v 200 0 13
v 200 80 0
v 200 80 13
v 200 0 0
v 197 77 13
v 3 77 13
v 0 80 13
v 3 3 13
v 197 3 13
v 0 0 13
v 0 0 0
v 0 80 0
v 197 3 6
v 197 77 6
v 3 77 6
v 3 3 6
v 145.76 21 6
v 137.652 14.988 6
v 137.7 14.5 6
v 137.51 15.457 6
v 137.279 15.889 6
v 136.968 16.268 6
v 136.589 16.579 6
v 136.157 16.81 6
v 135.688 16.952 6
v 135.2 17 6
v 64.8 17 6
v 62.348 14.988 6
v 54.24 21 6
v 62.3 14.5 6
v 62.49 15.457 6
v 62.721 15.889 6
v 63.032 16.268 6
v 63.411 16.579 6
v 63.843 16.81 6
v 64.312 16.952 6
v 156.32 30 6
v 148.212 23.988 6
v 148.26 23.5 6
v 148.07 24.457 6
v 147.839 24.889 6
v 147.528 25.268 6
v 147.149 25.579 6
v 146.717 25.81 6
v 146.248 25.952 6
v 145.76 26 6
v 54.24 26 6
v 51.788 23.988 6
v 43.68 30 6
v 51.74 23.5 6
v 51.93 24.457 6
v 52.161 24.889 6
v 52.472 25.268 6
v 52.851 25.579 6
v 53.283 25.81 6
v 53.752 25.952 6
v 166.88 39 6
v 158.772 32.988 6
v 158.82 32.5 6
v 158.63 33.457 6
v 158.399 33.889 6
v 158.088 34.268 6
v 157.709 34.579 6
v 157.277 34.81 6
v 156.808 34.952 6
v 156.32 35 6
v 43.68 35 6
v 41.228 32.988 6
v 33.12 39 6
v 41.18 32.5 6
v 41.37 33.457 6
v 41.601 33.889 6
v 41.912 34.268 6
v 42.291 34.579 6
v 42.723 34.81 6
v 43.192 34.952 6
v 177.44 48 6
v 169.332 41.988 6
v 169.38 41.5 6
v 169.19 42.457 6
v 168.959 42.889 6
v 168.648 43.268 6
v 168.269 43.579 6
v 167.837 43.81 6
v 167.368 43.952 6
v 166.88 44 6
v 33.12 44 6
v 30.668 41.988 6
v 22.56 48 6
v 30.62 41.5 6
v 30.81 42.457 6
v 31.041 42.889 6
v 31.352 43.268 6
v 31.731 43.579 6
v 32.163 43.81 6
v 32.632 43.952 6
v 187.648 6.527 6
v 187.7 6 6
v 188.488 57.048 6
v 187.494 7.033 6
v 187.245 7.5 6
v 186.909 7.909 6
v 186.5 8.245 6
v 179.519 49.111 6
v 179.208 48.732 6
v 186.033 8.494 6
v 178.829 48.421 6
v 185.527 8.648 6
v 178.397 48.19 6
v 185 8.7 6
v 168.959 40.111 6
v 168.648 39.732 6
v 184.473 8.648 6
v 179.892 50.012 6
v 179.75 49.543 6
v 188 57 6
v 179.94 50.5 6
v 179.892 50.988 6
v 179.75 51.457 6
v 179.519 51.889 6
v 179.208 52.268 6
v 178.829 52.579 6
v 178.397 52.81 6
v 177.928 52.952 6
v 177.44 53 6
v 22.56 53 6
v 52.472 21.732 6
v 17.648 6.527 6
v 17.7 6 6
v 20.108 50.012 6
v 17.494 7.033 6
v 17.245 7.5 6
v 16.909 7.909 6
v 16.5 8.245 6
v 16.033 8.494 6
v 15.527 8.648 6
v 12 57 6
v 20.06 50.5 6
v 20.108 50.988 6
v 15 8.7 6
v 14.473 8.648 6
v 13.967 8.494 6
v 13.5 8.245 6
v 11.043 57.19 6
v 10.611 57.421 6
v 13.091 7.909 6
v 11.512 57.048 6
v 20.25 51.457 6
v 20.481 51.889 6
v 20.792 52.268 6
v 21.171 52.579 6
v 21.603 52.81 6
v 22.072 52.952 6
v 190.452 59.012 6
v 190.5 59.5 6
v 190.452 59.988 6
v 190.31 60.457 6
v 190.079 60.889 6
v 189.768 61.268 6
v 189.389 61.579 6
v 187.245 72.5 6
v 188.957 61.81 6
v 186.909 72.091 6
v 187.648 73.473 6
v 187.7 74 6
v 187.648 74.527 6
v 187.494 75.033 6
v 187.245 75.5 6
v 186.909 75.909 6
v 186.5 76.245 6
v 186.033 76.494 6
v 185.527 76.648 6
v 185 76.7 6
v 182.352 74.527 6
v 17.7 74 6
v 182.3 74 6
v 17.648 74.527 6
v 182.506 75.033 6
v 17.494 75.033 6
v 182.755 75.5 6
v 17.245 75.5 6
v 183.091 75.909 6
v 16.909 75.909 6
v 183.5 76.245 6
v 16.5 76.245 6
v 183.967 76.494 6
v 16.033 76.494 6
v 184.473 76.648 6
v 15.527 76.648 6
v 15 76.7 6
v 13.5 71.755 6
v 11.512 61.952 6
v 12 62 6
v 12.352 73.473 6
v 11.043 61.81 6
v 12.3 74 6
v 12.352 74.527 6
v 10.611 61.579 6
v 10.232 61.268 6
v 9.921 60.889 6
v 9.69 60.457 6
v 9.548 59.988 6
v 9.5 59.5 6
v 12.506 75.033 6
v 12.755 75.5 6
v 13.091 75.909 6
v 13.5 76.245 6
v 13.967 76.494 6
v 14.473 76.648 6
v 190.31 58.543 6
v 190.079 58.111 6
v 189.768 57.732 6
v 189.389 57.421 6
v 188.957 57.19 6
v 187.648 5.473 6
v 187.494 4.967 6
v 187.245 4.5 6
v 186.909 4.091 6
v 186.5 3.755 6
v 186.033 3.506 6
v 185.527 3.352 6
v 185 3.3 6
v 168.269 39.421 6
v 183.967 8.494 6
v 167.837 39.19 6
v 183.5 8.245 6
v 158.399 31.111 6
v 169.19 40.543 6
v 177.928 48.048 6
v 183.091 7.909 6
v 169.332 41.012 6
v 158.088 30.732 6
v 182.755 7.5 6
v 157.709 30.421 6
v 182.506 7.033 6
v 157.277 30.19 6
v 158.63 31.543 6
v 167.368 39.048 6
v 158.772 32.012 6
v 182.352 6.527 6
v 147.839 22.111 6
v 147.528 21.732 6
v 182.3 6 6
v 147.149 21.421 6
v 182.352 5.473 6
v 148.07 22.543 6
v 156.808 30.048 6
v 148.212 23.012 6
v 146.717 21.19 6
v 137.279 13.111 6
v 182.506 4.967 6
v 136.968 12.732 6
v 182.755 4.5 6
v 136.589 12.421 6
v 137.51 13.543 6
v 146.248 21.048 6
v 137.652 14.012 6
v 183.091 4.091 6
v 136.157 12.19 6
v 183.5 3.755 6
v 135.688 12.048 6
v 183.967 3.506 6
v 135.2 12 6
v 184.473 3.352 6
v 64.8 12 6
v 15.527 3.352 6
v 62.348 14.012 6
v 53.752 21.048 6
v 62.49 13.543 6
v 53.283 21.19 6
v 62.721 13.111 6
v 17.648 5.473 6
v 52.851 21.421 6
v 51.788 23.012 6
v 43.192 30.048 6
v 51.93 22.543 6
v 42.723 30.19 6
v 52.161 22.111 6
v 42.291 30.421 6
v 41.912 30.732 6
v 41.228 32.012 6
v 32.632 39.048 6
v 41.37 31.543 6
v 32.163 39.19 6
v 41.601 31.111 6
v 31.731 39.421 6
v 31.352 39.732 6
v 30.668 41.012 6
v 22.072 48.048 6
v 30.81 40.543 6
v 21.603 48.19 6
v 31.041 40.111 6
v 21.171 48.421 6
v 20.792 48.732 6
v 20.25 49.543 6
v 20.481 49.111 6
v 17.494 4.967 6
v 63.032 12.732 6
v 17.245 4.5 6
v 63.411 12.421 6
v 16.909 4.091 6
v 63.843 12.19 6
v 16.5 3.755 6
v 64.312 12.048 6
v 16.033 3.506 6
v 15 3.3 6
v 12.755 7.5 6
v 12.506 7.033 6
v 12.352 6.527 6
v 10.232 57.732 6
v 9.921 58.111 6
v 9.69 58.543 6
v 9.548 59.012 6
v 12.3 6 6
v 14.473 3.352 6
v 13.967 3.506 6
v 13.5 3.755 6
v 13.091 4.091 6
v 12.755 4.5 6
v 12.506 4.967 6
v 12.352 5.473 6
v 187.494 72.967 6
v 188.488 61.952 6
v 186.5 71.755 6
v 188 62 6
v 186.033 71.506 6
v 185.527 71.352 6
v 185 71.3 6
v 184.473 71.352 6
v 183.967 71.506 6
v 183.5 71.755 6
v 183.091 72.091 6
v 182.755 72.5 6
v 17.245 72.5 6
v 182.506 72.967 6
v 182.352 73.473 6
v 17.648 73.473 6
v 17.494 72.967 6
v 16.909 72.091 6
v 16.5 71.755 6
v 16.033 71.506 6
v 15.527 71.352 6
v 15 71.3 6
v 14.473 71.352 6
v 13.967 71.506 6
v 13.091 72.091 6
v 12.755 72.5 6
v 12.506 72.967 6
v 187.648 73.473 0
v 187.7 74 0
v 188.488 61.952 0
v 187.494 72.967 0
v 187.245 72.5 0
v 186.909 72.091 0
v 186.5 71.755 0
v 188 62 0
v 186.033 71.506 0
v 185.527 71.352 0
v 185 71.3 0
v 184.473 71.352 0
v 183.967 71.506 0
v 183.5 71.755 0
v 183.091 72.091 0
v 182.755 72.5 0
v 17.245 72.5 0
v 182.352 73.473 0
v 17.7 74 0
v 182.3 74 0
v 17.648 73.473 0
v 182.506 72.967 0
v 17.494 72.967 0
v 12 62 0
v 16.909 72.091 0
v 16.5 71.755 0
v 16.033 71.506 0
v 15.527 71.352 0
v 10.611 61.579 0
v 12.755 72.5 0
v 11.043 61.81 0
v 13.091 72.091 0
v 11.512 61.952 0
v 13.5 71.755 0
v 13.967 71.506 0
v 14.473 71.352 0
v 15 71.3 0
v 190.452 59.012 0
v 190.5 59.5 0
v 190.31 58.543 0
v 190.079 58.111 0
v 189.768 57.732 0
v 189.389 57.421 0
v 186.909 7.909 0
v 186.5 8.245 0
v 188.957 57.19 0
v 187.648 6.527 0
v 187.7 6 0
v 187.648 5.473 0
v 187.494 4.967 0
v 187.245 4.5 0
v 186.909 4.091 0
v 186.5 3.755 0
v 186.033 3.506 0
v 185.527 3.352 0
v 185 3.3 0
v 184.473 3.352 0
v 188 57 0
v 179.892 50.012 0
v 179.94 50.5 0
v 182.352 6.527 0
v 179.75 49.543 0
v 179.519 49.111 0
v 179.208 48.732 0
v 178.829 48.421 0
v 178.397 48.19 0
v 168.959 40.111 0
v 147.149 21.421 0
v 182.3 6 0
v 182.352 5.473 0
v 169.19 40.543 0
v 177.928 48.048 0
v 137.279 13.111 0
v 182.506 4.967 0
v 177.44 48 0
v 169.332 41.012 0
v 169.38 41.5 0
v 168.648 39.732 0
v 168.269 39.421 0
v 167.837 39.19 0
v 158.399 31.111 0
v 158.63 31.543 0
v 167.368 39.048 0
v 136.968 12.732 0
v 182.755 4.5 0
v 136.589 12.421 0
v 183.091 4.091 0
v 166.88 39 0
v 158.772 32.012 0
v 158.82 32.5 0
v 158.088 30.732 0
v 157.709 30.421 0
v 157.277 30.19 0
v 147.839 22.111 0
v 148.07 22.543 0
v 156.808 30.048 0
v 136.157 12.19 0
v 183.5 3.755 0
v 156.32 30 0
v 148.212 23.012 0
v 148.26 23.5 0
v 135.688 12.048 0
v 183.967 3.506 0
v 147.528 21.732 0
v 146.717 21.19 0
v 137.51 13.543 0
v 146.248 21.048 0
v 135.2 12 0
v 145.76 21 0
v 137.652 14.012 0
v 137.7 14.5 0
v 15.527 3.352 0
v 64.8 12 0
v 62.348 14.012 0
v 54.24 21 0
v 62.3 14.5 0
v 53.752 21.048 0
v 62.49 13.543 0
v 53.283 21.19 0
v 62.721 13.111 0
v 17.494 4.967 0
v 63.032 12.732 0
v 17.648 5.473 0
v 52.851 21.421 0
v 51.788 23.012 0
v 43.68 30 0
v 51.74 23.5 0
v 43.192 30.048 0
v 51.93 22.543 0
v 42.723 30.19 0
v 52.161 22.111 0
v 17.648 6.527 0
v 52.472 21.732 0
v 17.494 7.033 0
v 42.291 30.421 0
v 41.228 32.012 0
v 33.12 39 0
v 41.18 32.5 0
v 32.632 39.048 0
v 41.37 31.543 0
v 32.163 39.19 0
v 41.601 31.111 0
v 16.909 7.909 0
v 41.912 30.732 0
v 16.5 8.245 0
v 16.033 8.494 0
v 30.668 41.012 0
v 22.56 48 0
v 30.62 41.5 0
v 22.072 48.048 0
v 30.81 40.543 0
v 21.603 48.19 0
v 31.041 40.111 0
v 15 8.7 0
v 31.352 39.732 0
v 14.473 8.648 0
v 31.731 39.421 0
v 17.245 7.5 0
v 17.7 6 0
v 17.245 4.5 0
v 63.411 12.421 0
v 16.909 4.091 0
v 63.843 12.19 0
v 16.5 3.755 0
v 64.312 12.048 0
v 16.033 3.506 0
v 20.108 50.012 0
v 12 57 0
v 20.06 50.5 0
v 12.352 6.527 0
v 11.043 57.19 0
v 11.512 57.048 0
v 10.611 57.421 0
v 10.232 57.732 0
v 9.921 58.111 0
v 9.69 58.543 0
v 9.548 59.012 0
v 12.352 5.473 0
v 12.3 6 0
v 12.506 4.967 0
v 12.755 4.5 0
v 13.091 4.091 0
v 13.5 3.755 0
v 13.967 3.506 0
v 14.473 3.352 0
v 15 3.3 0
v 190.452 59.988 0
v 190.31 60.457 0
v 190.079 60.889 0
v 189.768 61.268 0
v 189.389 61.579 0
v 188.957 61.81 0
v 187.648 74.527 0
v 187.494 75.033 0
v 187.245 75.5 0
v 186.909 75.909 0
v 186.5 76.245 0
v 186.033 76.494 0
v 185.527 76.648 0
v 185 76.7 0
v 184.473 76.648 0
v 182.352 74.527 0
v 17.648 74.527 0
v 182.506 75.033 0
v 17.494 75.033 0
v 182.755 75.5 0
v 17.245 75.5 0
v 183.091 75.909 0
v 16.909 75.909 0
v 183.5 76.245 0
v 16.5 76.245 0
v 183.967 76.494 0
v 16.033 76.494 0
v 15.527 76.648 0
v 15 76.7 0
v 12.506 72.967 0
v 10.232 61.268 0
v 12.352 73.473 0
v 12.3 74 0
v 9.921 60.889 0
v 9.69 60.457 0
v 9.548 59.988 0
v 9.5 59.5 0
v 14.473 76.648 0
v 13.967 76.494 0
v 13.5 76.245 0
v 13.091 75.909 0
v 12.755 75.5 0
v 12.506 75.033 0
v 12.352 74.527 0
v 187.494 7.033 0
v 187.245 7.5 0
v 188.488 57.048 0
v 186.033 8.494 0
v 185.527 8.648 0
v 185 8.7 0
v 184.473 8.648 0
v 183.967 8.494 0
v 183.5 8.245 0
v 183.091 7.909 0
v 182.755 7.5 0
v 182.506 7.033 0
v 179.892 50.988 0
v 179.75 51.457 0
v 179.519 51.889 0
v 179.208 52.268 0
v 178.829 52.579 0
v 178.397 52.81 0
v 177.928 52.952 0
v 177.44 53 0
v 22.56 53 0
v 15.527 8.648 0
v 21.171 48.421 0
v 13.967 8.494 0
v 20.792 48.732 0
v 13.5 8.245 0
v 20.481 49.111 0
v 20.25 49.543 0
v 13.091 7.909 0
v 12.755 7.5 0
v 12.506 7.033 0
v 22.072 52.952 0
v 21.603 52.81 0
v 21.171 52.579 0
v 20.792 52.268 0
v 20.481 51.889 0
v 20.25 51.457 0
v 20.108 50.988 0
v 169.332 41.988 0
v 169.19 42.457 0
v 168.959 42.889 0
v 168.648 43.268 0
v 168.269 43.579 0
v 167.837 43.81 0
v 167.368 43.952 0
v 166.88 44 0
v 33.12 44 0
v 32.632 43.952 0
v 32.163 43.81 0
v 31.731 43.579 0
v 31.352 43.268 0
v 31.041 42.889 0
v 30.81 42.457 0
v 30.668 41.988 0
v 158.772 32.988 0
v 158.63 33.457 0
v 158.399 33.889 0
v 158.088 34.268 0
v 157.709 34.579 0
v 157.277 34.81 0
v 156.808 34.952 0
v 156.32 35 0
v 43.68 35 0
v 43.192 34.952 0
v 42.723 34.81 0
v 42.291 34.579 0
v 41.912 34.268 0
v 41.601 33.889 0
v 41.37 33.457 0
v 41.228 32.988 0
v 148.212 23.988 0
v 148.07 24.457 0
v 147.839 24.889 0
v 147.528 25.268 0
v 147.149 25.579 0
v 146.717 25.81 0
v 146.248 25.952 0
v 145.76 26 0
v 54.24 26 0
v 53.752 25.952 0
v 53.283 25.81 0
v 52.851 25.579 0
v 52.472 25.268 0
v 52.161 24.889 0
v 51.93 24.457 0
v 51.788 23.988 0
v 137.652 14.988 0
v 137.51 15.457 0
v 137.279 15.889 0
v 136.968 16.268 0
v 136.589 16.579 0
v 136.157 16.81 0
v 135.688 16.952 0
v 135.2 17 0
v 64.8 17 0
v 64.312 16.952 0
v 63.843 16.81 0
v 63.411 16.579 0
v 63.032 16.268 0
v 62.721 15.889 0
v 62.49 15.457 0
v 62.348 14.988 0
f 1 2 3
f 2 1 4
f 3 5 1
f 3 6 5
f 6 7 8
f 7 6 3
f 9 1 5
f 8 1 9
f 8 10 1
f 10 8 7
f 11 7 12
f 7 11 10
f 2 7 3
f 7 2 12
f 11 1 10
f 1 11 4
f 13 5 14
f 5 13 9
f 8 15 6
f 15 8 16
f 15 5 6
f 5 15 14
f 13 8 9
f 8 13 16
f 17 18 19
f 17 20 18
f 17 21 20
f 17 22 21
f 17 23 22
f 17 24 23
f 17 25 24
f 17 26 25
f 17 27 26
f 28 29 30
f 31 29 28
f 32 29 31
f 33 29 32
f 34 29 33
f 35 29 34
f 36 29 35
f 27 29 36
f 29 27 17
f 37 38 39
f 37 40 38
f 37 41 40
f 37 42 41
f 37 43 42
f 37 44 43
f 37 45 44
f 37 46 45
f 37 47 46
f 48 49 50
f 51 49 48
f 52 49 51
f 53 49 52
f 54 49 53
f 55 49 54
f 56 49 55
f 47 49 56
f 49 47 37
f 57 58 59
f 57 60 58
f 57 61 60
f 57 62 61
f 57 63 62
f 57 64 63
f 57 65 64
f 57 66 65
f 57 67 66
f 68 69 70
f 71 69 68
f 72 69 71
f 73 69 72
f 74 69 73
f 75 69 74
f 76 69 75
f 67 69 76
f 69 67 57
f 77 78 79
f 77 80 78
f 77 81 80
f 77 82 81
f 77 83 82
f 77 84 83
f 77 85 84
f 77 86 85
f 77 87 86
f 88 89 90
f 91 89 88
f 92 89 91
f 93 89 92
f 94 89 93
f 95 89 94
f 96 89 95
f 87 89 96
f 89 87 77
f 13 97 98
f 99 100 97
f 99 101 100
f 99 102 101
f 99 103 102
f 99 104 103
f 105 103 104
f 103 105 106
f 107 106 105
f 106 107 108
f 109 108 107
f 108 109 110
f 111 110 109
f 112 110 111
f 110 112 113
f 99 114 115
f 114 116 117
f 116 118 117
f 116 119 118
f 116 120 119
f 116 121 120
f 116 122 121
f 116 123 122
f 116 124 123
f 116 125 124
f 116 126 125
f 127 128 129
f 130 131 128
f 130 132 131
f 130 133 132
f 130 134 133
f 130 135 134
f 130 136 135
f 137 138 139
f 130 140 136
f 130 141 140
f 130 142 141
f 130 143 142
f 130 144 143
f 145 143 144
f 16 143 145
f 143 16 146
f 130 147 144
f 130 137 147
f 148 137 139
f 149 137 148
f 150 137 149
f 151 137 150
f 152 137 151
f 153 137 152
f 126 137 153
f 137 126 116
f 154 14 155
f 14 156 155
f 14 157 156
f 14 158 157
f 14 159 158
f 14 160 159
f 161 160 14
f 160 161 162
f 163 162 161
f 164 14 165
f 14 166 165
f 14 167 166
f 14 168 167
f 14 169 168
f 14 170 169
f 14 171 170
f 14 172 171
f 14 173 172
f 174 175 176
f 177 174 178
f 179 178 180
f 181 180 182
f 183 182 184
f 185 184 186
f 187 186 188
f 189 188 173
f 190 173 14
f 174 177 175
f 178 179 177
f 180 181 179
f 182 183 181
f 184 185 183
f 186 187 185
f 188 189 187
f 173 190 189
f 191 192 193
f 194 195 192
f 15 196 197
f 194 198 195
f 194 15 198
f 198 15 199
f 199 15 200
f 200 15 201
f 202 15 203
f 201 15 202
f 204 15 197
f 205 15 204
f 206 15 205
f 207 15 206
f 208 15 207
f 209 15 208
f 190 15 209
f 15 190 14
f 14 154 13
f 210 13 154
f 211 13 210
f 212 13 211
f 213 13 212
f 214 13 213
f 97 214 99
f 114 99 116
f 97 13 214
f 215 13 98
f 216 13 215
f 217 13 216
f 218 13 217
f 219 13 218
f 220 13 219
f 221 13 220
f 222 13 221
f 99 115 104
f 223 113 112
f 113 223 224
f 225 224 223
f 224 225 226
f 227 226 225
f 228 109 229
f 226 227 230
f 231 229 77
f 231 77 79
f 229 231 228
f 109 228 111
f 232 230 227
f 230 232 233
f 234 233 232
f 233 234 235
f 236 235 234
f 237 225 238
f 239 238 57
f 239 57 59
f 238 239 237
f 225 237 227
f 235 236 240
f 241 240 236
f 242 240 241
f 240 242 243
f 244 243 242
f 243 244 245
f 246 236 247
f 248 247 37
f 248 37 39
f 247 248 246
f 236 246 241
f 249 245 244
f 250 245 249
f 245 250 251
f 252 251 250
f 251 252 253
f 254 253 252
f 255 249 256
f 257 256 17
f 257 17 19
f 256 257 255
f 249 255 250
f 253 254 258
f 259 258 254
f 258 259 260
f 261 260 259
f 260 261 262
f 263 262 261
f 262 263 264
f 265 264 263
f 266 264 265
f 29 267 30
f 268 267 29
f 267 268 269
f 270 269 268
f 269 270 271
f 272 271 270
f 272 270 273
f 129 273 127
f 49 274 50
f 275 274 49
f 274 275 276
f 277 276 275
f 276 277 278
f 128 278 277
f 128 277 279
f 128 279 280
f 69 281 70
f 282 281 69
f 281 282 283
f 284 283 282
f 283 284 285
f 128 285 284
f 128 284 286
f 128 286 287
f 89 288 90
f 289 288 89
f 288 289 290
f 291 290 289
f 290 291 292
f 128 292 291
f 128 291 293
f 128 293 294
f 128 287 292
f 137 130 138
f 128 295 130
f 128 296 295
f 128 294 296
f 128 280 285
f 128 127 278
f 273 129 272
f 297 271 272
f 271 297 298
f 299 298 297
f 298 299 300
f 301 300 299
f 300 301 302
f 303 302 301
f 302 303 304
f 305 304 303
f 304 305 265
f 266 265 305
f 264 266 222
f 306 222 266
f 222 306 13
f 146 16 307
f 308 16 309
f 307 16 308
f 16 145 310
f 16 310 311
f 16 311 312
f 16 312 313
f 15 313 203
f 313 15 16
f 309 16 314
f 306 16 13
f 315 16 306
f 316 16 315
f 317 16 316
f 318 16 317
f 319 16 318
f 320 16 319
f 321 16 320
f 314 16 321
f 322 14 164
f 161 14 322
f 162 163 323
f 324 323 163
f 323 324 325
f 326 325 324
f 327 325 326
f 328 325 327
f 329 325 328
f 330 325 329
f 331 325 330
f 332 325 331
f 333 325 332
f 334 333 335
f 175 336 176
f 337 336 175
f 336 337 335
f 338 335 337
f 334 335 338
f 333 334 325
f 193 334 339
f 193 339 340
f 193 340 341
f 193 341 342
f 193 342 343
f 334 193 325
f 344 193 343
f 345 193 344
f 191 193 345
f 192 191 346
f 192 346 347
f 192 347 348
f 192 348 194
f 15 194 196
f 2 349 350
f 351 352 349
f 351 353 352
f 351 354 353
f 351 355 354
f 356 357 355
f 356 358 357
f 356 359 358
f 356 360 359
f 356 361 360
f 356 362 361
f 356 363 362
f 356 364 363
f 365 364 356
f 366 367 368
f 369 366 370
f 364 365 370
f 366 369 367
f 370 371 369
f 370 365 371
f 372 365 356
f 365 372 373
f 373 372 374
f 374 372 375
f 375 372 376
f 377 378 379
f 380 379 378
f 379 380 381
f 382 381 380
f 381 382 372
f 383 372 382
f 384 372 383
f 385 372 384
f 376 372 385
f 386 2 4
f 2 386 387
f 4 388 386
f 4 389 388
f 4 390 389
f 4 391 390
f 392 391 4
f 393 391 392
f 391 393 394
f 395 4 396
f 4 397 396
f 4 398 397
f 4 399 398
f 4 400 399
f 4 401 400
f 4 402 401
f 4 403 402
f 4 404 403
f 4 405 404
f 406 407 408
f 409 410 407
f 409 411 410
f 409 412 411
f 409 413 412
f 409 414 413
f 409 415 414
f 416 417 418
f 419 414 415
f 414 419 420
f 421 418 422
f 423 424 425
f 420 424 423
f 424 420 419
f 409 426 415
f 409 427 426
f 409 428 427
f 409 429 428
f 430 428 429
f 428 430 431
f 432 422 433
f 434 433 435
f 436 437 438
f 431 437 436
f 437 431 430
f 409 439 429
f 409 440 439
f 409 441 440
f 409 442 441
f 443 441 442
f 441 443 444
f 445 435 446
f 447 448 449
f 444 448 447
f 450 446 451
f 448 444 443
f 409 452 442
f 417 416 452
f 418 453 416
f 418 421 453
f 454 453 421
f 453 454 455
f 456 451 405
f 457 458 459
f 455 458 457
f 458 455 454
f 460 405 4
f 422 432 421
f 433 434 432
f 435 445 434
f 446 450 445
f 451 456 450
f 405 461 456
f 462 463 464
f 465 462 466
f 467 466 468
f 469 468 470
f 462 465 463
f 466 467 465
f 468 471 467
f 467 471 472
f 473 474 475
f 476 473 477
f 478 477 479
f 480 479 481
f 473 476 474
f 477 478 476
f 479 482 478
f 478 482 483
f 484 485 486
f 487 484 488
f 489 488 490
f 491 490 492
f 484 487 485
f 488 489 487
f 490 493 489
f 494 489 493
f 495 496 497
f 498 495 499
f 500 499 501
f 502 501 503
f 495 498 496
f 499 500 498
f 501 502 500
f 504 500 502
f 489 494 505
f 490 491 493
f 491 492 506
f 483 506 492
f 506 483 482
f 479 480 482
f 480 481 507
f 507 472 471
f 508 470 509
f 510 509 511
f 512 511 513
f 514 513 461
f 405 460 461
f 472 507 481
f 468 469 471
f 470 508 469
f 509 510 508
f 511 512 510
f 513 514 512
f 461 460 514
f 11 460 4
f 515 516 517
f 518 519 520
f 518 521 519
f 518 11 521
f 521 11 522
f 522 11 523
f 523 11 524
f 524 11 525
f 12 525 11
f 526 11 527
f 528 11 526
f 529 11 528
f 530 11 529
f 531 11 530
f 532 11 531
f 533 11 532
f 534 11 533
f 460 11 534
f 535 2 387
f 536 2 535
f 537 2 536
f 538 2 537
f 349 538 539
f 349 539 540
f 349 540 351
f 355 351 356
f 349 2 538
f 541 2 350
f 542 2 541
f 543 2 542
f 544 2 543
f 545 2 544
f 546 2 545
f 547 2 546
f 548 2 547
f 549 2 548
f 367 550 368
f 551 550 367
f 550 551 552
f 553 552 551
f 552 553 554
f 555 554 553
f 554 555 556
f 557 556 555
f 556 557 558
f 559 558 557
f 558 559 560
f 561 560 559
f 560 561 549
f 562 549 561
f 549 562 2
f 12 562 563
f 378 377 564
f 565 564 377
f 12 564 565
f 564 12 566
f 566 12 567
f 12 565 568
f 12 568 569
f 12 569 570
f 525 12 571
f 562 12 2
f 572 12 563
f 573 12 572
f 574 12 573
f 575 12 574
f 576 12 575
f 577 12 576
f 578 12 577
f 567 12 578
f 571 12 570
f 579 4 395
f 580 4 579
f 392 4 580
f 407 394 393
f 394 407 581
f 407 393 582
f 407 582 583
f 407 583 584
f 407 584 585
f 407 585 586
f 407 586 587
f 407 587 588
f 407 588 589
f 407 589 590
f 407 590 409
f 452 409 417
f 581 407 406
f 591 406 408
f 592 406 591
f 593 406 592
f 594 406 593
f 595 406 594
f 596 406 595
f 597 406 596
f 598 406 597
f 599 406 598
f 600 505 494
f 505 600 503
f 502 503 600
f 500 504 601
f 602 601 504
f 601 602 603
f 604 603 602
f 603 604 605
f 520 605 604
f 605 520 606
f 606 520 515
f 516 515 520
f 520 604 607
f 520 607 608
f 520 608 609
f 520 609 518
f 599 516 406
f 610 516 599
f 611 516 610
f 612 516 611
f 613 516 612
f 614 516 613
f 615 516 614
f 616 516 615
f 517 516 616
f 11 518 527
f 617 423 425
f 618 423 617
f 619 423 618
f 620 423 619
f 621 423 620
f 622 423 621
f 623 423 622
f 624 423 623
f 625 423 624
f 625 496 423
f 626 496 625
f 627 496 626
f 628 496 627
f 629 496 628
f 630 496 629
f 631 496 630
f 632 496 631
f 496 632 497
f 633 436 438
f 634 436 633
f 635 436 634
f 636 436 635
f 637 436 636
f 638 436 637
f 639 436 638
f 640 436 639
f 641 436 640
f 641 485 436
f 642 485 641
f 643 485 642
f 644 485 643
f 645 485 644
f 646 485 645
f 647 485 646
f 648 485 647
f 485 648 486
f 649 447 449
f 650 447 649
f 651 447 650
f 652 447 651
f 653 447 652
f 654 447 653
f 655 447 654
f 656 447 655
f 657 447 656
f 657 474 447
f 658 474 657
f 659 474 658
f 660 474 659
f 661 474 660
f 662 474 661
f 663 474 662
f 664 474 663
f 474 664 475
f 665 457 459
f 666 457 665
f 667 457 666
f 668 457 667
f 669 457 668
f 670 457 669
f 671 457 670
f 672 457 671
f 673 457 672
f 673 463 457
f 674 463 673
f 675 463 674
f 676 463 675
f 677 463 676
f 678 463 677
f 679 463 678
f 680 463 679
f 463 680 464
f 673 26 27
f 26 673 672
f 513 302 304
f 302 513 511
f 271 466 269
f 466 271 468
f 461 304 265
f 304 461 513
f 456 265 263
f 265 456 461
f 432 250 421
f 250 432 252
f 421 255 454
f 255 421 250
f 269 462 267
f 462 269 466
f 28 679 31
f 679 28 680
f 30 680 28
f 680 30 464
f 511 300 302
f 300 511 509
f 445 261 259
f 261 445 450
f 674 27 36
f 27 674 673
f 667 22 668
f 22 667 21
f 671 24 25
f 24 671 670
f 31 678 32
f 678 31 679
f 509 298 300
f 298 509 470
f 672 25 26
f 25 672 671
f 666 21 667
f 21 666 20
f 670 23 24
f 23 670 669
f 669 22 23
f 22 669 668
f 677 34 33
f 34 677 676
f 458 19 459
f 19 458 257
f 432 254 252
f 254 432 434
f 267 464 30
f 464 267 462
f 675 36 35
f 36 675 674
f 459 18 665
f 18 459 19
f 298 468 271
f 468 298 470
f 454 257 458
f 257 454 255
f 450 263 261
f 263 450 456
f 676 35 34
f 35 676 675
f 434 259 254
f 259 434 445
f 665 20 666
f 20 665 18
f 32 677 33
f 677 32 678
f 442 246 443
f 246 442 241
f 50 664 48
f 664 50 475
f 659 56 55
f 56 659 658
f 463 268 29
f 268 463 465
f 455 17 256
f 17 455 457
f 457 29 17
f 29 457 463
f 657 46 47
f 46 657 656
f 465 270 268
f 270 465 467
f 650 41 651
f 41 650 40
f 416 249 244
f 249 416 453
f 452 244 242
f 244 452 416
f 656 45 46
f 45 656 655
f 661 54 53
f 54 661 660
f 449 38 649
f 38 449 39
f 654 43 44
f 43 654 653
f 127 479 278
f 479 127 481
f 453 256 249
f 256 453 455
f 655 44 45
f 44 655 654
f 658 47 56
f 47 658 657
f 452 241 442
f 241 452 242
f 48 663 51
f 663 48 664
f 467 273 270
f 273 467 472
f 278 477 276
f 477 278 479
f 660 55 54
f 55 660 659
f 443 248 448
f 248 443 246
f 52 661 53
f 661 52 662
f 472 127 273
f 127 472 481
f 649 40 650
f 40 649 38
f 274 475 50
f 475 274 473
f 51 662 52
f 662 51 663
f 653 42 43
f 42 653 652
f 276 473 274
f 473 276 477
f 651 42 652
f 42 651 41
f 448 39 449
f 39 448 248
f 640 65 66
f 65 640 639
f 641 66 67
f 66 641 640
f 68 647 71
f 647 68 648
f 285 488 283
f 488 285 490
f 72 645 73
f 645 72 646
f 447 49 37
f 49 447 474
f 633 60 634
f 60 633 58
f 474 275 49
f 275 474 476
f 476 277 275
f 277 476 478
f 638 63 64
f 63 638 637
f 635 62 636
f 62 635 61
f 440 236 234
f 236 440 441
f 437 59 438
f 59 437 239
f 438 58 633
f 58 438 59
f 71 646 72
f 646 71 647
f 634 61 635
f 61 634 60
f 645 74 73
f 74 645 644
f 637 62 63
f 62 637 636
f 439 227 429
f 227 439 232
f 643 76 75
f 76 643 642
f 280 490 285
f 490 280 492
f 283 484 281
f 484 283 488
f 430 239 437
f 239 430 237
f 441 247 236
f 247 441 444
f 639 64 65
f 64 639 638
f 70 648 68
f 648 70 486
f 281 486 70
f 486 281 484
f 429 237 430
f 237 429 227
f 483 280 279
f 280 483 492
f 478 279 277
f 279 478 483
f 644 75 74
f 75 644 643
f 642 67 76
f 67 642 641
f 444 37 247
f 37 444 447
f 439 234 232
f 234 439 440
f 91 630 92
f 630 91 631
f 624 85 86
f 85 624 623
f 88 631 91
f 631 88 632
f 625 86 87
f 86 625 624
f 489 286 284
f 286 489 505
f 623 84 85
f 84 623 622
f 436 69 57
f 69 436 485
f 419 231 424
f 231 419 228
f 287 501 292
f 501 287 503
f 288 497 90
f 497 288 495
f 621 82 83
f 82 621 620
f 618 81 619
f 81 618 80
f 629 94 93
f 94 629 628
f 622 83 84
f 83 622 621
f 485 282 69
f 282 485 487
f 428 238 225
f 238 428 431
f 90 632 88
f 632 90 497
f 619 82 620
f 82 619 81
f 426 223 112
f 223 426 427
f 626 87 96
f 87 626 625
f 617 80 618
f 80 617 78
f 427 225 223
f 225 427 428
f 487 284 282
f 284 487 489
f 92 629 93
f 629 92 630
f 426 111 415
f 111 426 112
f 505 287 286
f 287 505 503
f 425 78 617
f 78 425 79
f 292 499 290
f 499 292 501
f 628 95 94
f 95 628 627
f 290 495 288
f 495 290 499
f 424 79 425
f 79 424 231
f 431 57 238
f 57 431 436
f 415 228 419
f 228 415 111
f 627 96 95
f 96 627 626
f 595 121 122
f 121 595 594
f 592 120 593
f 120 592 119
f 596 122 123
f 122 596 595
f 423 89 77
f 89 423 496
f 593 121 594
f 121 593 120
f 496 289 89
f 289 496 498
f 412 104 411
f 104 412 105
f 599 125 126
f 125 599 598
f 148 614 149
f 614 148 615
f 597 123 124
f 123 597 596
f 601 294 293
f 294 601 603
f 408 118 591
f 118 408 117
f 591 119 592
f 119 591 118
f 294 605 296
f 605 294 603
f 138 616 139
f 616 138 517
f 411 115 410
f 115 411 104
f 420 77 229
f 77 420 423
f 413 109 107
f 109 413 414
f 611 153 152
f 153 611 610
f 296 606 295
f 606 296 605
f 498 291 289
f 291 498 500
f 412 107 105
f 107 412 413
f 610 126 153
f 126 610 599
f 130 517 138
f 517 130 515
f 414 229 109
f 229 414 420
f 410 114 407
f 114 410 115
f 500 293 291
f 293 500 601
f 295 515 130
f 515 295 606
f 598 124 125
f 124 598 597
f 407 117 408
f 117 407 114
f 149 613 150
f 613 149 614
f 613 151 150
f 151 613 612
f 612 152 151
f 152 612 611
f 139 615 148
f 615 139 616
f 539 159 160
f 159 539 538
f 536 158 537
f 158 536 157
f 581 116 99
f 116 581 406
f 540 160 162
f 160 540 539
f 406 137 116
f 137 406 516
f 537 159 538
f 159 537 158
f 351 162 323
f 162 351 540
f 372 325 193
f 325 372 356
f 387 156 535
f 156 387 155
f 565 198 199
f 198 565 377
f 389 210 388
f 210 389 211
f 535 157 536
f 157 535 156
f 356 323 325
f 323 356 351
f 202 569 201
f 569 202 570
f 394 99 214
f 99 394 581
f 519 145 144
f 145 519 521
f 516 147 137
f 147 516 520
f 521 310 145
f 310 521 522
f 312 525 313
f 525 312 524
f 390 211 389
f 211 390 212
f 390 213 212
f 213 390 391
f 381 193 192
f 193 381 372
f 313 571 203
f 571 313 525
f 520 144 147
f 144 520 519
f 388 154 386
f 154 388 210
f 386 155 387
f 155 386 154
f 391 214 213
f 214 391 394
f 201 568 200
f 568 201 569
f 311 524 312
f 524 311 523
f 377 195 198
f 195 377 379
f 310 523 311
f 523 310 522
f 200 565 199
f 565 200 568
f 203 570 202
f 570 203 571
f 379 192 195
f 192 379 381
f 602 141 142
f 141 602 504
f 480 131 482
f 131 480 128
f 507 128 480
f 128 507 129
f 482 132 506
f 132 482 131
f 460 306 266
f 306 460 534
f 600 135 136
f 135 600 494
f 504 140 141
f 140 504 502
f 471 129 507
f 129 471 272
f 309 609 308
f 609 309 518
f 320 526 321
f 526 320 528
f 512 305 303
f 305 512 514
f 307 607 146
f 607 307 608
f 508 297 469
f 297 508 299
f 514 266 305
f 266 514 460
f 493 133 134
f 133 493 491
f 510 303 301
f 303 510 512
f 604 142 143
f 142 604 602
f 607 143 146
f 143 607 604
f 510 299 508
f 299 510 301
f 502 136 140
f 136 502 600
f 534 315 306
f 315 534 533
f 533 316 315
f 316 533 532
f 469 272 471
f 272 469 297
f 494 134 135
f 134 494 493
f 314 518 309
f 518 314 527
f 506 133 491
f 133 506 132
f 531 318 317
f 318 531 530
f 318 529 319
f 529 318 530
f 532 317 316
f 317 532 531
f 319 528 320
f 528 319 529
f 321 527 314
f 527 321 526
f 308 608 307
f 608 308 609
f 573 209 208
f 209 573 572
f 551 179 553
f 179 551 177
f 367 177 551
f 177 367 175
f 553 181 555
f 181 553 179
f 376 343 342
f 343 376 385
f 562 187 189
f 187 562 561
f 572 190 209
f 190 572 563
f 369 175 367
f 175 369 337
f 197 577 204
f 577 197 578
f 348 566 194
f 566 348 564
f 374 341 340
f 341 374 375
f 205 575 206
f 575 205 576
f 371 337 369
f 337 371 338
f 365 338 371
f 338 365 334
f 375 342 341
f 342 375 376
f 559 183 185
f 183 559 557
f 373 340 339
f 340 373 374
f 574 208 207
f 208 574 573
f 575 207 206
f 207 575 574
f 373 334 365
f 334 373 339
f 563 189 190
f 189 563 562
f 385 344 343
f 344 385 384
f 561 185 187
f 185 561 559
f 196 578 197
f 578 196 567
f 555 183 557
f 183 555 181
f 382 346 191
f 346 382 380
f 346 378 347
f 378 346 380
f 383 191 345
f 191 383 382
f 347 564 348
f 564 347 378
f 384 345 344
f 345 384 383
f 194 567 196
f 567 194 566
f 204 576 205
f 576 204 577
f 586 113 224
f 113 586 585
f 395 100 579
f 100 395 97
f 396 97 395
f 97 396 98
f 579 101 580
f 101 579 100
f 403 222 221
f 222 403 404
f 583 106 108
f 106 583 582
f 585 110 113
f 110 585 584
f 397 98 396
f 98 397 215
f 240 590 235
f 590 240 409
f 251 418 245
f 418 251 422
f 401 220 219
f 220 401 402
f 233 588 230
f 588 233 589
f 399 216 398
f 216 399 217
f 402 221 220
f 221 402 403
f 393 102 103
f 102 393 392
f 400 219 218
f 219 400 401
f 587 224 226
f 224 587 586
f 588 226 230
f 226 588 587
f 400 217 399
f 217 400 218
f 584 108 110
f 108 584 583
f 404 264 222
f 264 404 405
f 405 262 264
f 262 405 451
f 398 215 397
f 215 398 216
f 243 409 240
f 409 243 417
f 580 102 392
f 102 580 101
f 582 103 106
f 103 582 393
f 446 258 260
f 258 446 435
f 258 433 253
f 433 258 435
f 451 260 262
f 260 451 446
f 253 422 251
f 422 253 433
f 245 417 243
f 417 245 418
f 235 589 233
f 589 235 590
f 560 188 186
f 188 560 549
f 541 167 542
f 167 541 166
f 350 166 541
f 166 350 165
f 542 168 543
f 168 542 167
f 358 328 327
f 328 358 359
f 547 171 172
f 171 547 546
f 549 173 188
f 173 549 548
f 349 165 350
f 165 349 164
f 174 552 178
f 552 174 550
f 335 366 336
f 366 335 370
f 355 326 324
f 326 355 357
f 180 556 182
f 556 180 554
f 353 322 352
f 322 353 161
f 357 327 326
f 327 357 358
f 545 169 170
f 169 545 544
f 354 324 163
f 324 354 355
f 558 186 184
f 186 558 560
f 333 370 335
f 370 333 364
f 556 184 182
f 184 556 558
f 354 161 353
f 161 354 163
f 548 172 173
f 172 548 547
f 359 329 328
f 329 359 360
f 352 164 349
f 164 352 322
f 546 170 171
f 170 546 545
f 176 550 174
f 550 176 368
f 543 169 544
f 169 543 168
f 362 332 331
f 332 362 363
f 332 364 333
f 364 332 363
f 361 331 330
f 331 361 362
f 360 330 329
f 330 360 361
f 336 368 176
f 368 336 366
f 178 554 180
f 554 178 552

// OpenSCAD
$fn = 32;

// ----------------------------------------------------------------------
// Slotted panel: 200 x 80 mm, 6 рядов of slots
// ----------------------------------------------------------------------

// --- parameters (mm) ---
panel_w = 200;            // panel width
panel_d = 80;             // panel depth
thick = 6;                // panel thickness
slot_w = 5;               // slot width
pitch0 = 9;               // first row pitch
pitch_step = 2.4;         // pitch increase per row
margin = 12;              // margin around the slot field
rows = 6;                 // number of slot rows
mount_d = 5.4;            // mounting holes
mount_x = 85;             // mounting hole offset
rim_h = 13;               // rim height
rim_t = 3;                // rim wall thickness

difference() {
  union() {
    cube([panel_w, panel_d, thick]);
    translate([0, 0, thick - 1]) difference() {
      cube([panel_w, panel_d, rim_h - thick + 1]);
      translate([rim_t, rim_t, -2.5]) cube([panel_w - 2 * rim_t, panel_d - 2 * rim_t, rim_h - thick + 6]);
    }
  }
  /* slot rows: stadium shaped cutters, 2.5 mm clear of both faces */
  /* row 0: pitch 9, length 70.4 */
  hull() {
    translate([64.8, 14.5, -2.5]) cylinder(h = thick + 5, d = slot_w);
    translate([135.2, 14.5, -2.5]) cylinder(h = thick + 5, d = slot_w);
  }
  /* row 1: pitch 9, length 91.52 */
  hull() {
    translate([54.24, 23.5, -2.5]) cylinder(h = thick + 5, d = slot_w);
    translate([145.76, 23.5, -2.5]) cylinder(h = thick + 5, d = slot_w);
  }
  /* row 2: pitch 9, length 112.64 */
  hull() {
    translate([43.68, 32.5, -2.5]) cylinder(h = thick + 5, d = slot_w);
    translate([156.32, 32.5, -2.5]) cylinder(h = thick + 5, d = slot_w);
  }
  /* row 3: pitch 9, length 133.76 */
  hull() {
    translate([33.12, 41.5, -2.5]) cylinder(h = thick + 5, d = slot_w);
    translate([166.88, 41.5, -2.5]) cylinder(h = thick + 5, d = slot_w);
  }
  /* row 4: pitch 9, length 154.88 */
  hull() {
    translate([22.56, 50.5, -2.5]) cylinder(h = thick + 5, d = slot_w);
    translate([177.44, 50.5, -2.5]) cylinder(h = thick + 5, d = slot_w);
  }
  /* row 5: pitch 9, length 176 */
  hull() {
    translate([12, 59.5, -2.5]) cylinder(h = thick + 5, d = slot_w);
    translate([188, 59.5, -2.5]) cylinder(h = thick + 5, d = slot_w);
  }
  translate([15, 6, -2.5]) cylinder(h = 18, d = mount_d);
  translate([15, 74, -2.5]) cylinder(h = 18, d = mount_d);
  translate([185, 6, -2.5]) cylinder(h = 18, d = mount_d);
  translate([185, 74, -2.5]) cylinder(h = 18, d = mount_d);
}
